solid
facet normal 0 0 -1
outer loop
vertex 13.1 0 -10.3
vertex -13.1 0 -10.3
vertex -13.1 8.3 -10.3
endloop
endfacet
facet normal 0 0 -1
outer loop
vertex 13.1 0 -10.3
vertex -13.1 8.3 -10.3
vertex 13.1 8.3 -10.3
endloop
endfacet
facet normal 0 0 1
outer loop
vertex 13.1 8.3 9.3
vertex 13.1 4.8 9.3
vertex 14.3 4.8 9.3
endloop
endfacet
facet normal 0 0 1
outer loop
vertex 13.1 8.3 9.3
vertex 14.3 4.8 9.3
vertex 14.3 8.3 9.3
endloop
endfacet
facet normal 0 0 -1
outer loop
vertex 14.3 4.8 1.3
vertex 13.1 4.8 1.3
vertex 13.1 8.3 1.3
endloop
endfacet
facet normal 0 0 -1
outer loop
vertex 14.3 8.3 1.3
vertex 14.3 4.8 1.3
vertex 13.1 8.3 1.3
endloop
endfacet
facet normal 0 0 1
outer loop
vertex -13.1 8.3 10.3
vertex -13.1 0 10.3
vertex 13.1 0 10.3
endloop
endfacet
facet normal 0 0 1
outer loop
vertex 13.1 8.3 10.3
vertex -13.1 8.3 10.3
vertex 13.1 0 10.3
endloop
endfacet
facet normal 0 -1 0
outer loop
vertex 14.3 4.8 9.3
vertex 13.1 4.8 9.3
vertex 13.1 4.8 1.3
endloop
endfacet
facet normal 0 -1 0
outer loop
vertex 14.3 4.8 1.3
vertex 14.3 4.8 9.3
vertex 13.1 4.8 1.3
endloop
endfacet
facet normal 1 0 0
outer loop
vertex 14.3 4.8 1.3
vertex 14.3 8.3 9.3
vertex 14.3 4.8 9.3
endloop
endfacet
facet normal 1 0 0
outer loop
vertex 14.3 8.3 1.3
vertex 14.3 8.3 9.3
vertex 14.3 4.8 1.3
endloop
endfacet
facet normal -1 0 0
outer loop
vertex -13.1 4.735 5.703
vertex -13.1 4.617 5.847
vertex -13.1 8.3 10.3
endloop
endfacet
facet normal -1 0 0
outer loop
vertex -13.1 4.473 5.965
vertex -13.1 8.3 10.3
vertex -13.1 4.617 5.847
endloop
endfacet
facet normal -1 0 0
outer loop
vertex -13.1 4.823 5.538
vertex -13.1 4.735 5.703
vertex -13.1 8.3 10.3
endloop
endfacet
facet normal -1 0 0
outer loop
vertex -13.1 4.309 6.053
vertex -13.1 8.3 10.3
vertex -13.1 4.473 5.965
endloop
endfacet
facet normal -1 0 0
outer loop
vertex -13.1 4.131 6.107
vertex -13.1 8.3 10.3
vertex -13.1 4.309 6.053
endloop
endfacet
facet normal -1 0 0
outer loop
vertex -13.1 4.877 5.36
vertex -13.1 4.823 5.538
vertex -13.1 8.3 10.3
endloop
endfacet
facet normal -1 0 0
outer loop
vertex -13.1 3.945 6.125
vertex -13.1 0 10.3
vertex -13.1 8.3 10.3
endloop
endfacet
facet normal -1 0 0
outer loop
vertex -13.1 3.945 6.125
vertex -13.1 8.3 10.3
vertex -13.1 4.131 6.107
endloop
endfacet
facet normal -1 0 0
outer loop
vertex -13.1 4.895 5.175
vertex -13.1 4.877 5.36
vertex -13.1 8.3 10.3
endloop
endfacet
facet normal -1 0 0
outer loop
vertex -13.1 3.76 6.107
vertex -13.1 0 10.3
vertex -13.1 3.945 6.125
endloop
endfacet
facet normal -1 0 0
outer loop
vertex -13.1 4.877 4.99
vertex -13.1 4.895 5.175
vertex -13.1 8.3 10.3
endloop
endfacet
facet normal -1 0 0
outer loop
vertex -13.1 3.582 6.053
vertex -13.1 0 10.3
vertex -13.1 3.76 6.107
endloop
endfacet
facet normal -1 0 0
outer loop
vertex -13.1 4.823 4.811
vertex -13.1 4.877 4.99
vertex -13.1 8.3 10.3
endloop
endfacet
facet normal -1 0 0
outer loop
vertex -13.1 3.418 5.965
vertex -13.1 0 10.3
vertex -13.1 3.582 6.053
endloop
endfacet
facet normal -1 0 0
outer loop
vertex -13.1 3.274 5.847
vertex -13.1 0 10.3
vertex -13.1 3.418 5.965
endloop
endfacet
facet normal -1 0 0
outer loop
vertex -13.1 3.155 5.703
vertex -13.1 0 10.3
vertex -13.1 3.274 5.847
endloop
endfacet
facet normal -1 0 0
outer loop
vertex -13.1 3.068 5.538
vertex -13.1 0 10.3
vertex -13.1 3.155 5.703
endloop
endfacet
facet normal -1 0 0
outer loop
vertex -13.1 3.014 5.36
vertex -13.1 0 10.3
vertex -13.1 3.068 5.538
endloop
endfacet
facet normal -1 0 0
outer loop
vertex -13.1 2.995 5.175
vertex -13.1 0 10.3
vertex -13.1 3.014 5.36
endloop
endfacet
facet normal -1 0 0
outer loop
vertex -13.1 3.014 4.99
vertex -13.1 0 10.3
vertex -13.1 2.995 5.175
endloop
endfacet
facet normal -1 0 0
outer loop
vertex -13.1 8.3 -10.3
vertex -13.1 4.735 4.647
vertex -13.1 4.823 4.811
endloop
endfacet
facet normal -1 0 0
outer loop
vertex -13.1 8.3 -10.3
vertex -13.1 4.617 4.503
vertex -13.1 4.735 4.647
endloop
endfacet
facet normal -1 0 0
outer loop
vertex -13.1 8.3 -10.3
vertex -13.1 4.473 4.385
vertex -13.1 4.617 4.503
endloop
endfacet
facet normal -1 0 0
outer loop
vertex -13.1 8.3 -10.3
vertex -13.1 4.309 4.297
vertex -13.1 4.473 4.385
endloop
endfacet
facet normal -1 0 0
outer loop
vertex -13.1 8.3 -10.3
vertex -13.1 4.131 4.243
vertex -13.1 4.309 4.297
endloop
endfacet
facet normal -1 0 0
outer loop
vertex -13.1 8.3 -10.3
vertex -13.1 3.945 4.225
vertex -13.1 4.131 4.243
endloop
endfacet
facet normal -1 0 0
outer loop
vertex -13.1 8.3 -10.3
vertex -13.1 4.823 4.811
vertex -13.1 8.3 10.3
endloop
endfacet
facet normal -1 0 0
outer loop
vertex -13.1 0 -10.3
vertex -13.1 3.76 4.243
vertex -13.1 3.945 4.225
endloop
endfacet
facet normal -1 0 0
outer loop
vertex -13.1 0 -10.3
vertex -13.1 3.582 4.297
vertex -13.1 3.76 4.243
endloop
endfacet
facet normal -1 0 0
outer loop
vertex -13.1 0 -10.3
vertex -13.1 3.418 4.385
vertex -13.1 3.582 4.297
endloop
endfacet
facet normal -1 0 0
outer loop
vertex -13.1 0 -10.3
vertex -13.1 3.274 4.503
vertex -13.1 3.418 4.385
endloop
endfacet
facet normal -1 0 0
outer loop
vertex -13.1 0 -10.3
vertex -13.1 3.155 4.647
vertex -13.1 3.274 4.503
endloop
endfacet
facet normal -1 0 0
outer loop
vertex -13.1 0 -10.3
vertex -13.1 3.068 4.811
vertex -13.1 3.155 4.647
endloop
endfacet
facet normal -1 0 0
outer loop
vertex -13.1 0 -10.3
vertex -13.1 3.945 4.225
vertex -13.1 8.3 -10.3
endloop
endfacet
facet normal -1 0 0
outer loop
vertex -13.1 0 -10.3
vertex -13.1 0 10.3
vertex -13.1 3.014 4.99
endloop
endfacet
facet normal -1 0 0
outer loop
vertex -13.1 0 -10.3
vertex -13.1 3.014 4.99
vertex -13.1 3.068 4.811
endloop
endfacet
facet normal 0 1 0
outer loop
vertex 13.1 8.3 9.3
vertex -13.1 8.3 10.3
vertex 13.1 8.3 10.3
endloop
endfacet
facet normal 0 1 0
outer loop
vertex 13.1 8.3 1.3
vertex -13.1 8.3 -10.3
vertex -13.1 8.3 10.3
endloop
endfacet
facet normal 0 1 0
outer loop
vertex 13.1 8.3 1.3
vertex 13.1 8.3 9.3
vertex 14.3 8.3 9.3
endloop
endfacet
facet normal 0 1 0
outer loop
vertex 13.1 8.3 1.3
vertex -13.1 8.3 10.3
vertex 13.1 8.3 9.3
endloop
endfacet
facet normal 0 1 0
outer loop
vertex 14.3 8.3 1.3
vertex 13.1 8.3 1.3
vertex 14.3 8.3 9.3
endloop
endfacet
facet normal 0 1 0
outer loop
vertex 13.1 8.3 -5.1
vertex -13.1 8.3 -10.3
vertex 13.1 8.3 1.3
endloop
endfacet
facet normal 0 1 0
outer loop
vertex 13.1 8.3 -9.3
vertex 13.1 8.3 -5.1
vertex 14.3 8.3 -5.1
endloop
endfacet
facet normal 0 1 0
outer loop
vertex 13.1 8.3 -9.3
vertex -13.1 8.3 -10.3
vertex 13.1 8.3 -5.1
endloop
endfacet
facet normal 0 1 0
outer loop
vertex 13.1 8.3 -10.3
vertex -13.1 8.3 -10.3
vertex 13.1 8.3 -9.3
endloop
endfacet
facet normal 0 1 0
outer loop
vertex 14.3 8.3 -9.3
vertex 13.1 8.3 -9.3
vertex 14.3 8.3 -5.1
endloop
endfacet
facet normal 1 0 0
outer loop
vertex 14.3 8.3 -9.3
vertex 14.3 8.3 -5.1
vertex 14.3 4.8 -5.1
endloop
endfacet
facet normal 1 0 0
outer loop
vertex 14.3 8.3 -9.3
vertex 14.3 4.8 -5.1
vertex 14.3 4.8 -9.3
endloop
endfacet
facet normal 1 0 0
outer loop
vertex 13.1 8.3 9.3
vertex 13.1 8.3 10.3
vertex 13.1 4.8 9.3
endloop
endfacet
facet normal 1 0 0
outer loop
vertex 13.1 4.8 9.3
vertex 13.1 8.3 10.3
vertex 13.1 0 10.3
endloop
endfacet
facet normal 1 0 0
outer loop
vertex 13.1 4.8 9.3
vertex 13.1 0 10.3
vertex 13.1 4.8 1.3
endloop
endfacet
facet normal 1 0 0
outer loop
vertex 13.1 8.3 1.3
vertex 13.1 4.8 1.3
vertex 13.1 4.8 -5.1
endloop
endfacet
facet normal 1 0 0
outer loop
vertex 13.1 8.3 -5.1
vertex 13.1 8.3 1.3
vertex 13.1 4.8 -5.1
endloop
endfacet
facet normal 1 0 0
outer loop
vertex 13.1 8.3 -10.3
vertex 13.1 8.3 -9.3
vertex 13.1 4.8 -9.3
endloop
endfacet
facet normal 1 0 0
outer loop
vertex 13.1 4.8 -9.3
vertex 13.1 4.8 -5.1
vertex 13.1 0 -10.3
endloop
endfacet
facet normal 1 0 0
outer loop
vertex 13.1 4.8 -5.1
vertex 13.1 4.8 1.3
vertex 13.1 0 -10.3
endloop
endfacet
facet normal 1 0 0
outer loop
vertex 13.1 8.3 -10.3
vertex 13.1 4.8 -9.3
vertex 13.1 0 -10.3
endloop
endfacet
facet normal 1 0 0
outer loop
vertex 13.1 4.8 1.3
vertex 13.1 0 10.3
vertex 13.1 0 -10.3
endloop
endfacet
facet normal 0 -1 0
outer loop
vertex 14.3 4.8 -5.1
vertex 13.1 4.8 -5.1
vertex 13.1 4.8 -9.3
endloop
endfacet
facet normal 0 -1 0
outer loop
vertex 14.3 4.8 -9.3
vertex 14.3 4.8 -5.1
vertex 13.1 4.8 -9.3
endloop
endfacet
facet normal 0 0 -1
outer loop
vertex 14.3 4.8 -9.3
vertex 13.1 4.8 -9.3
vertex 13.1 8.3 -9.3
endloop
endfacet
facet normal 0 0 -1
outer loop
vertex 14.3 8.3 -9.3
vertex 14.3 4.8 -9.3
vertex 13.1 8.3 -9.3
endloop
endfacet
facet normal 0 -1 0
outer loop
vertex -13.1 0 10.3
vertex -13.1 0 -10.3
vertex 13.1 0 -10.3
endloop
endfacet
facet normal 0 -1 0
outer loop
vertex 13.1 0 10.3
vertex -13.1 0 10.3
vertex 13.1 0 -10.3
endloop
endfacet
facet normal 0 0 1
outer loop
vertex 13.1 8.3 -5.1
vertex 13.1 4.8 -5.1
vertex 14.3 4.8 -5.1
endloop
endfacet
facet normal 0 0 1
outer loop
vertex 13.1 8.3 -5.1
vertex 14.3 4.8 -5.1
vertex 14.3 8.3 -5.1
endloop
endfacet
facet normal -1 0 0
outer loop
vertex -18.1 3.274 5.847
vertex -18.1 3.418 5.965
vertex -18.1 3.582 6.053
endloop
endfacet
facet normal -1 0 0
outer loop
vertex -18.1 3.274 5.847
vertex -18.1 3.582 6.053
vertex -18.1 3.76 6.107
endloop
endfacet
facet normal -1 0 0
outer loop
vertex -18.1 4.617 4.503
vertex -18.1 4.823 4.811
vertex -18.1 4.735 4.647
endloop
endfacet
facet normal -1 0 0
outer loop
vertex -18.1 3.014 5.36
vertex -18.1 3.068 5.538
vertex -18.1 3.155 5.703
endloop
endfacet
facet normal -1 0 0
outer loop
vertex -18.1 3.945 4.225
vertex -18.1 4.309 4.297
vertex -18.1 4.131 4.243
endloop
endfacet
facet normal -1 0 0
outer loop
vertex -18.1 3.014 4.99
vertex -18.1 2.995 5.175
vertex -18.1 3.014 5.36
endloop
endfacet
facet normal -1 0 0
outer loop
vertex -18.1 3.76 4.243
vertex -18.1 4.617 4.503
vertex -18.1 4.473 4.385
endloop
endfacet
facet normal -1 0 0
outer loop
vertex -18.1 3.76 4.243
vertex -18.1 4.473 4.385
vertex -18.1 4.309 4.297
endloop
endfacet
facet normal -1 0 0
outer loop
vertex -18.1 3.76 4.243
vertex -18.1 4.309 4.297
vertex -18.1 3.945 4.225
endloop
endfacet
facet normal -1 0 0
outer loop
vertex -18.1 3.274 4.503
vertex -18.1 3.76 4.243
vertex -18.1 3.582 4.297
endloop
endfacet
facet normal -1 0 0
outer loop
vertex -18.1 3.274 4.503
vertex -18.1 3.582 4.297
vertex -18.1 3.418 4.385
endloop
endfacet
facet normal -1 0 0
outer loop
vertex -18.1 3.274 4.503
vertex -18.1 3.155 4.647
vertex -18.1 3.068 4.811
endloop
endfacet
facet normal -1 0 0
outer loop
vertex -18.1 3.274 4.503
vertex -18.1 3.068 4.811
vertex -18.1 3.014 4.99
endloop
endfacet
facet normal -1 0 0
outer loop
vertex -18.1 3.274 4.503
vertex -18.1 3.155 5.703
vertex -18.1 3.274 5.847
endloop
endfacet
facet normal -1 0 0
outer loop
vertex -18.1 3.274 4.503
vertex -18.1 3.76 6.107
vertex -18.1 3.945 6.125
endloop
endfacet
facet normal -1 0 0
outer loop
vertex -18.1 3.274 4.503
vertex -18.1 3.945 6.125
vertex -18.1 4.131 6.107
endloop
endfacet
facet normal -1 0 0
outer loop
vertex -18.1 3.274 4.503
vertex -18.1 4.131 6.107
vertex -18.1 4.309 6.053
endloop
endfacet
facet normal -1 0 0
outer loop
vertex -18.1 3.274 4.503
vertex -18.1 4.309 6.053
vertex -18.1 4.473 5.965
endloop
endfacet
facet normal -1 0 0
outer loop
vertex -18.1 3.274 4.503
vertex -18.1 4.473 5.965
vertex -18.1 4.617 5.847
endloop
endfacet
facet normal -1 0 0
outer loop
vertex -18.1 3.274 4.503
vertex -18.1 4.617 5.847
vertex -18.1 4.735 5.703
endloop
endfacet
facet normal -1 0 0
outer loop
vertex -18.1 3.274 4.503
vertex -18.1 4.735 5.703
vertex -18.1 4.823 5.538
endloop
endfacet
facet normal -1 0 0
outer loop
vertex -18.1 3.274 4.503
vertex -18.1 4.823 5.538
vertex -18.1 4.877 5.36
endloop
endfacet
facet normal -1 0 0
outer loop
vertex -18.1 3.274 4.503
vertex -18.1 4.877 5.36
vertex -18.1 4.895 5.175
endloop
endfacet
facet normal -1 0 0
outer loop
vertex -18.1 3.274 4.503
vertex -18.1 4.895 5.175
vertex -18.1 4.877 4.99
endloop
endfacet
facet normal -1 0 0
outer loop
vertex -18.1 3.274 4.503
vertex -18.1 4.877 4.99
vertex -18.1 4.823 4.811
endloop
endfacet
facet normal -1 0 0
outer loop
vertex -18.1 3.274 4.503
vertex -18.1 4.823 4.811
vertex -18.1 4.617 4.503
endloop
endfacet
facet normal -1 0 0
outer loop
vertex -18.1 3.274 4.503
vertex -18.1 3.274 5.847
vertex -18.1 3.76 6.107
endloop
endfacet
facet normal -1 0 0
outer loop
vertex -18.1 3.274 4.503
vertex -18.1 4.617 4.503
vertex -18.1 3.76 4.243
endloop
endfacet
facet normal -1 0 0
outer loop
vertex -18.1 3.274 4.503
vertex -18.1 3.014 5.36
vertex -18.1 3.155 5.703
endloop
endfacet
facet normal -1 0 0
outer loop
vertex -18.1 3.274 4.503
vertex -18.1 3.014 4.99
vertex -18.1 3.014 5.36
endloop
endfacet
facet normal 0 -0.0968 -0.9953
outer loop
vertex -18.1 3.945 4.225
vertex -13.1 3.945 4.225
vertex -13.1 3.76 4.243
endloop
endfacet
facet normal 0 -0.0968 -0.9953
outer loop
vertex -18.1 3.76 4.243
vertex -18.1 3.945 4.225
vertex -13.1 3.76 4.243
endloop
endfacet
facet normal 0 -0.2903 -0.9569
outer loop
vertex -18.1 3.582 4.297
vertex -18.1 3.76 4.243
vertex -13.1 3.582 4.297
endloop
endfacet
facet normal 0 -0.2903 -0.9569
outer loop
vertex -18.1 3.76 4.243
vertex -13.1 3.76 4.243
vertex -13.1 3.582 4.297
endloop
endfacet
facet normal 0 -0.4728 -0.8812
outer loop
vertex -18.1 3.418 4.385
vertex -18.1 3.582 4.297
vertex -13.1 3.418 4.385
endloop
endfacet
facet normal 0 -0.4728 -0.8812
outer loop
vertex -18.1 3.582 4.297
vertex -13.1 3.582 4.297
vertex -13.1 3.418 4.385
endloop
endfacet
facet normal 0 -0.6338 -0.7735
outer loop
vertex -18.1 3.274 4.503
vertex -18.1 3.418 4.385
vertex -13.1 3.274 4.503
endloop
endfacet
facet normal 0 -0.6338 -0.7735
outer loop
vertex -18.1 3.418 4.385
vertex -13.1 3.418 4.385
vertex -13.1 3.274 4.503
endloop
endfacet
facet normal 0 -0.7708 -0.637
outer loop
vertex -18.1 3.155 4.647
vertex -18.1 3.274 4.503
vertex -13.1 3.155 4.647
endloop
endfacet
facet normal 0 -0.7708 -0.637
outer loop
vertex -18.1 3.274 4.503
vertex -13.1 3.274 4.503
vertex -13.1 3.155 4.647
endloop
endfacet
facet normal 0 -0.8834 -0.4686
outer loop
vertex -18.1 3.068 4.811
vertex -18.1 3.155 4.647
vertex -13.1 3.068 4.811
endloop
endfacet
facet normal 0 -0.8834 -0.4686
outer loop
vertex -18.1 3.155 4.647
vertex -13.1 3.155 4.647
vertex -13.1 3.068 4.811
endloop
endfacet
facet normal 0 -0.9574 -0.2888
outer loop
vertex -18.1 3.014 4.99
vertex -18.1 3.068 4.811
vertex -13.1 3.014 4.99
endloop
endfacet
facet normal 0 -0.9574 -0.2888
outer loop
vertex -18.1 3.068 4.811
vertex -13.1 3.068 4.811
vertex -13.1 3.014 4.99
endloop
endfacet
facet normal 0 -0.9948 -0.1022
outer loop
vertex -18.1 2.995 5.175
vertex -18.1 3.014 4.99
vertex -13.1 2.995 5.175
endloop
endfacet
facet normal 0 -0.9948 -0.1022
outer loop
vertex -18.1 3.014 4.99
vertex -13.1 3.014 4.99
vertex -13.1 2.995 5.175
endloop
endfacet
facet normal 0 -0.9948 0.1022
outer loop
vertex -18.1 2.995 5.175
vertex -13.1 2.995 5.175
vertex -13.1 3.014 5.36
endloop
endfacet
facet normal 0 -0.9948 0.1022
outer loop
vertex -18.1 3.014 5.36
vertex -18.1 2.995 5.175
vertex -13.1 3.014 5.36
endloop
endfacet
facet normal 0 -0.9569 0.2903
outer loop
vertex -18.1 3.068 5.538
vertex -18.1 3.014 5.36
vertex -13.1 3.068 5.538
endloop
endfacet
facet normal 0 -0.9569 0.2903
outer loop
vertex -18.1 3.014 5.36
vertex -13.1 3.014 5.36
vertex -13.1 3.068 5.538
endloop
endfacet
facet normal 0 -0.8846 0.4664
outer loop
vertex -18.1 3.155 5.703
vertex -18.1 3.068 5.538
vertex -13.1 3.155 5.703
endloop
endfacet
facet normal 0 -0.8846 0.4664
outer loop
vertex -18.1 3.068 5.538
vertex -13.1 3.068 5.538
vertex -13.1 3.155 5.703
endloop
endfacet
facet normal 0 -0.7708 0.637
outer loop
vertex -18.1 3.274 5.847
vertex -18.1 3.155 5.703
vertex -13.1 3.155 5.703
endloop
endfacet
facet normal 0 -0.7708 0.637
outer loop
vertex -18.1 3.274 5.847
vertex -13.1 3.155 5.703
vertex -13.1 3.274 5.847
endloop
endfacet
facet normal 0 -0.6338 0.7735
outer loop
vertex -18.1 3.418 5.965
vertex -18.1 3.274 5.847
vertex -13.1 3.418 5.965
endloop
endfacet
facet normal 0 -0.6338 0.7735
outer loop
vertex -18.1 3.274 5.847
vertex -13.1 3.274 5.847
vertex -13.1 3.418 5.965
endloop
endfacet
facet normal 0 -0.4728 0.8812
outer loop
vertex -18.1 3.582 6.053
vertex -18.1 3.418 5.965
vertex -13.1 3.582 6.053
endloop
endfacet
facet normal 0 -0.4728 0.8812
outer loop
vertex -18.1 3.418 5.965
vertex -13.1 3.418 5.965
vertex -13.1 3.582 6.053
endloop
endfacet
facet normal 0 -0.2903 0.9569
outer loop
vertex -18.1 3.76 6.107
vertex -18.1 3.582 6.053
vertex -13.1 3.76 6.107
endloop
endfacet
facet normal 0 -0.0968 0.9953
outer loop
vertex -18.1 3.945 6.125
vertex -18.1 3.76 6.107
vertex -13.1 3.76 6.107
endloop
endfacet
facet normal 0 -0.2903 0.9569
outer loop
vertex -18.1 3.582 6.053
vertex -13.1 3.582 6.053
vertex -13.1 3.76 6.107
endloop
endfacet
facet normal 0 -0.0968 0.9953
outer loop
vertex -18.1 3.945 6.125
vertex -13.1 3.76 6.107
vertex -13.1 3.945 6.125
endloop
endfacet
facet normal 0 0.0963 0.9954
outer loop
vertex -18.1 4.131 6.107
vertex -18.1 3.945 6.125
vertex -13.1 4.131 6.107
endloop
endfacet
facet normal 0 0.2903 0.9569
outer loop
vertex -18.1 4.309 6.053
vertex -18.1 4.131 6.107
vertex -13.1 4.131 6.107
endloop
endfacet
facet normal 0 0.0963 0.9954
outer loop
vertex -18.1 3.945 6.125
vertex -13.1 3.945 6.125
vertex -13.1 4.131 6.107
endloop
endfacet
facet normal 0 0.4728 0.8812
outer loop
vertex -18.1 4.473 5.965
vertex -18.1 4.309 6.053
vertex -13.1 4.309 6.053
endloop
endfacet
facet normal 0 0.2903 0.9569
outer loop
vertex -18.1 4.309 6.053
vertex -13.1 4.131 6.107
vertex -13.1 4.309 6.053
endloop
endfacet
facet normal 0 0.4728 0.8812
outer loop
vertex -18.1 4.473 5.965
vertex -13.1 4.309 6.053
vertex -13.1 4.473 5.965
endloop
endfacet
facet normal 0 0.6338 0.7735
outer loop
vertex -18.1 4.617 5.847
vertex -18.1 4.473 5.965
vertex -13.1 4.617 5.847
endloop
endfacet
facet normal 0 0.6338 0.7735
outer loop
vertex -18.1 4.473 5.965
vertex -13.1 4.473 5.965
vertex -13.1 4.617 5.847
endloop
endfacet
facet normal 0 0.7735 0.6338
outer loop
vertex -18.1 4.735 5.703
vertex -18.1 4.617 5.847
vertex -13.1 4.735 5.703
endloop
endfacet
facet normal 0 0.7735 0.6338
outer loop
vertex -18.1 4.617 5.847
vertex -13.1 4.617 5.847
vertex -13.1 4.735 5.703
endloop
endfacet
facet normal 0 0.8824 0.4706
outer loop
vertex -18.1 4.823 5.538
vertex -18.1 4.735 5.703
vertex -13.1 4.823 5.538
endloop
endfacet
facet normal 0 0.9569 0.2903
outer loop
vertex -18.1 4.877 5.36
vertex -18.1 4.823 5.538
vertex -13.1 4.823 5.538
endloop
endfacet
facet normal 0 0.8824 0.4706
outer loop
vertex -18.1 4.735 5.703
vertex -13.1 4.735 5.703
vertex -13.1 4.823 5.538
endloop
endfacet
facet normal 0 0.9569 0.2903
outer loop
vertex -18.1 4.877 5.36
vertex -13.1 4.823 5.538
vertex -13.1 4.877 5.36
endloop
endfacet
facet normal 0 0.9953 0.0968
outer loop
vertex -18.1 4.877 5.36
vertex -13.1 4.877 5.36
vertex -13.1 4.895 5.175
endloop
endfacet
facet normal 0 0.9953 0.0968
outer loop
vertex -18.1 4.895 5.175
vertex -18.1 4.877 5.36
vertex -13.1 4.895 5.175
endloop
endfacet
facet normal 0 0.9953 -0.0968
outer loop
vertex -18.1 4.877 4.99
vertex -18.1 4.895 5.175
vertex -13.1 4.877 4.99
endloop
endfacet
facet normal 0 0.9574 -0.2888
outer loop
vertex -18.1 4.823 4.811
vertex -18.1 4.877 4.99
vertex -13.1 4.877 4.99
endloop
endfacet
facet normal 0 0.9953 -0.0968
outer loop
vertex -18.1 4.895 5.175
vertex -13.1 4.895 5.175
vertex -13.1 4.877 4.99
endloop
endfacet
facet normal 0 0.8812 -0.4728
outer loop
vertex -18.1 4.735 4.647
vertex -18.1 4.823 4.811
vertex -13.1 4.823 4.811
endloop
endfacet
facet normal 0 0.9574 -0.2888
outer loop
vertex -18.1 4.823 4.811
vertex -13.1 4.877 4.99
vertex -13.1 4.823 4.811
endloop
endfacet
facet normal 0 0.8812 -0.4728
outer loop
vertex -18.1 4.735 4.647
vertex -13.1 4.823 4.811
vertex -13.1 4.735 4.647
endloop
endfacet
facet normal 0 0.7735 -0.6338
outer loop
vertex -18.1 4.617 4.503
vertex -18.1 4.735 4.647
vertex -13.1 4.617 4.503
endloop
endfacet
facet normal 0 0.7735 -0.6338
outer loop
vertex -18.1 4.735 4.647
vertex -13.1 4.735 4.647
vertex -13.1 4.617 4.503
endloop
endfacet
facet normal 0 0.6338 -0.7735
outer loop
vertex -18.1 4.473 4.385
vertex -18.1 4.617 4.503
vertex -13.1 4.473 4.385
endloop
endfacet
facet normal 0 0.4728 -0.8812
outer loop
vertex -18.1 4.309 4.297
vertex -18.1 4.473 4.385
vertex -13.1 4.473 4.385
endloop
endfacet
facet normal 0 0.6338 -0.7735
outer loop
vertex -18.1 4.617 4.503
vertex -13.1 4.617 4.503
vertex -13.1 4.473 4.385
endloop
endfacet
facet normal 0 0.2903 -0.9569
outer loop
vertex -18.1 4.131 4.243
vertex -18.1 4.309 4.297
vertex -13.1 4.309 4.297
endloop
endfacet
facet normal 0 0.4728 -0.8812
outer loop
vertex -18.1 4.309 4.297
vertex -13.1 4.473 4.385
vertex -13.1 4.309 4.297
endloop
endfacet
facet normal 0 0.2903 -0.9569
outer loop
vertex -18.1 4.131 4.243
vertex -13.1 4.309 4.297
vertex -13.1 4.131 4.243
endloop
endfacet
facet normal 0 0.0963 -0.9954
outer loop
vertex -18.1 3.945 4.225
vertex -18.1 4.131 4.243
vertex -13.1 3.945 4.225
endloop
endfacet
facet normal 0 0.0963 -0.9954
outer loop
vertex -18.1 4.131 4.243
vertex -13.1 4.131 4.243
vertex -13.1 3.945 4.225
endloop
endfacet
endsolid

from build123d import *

# Parameters (mm, degrees)
SKETCH1_W           = 26.2
SKETCH1_H           = 20.6
BOSS_EXTRUDE1_DEPTH = 8.3
SKETCH2_W           = 8
SKETCH2_H           = 3.5
SKETCH2_W_2         = 4.2
BOSS_EXTRUDE2_DEPTH = 1.2
SKETCH3_R           = 0.95
BOSS_EXTRUDE3_DEPTH = 5


with BuildPart() as part:
    # Sketch1 → Boss-Extrude1 (new body)
    with BuildSketch(Plane(origin=(0, 0, 0), x_dir=(1, 0, 0), z_dir=(0, 1, 0))):
        Rectangle(SKETCH1_W, SKETCH1_H)
    extrude(amount=BOSS_EXTRUDE1_DEPTH)

    # Sketch2 → Boss-Extrude2 (add)
    with BuildSketch(Plane(origin=(13.1, 0, 0), x_dir=(0, 0, -1), z_dir=(1, 0, 0))):
        with Locations((-5.3, 6.55)):
            Rectangle(SKETCH2_W, SKETCH2_H)
        with Locations((7.2, 6.55)):
            Rectangle(SKETCH2_W_2, SKETCH2_H)
    extrude(amount=BOSS_EXTRUDE2_DEPTH)

    # Sketch3 → Boss-Extrude3 (add)
    with BuildSketch(Plane.ZY.offset(13.1)):
        with Locations(Location((5.174837269, 3.945319614, 0), (0, 0, 180))):
            Circle(SKETCH3_R)
    extrude(amount=BOSS_EXTRUDE3_DEPTH)


solid = part.part
